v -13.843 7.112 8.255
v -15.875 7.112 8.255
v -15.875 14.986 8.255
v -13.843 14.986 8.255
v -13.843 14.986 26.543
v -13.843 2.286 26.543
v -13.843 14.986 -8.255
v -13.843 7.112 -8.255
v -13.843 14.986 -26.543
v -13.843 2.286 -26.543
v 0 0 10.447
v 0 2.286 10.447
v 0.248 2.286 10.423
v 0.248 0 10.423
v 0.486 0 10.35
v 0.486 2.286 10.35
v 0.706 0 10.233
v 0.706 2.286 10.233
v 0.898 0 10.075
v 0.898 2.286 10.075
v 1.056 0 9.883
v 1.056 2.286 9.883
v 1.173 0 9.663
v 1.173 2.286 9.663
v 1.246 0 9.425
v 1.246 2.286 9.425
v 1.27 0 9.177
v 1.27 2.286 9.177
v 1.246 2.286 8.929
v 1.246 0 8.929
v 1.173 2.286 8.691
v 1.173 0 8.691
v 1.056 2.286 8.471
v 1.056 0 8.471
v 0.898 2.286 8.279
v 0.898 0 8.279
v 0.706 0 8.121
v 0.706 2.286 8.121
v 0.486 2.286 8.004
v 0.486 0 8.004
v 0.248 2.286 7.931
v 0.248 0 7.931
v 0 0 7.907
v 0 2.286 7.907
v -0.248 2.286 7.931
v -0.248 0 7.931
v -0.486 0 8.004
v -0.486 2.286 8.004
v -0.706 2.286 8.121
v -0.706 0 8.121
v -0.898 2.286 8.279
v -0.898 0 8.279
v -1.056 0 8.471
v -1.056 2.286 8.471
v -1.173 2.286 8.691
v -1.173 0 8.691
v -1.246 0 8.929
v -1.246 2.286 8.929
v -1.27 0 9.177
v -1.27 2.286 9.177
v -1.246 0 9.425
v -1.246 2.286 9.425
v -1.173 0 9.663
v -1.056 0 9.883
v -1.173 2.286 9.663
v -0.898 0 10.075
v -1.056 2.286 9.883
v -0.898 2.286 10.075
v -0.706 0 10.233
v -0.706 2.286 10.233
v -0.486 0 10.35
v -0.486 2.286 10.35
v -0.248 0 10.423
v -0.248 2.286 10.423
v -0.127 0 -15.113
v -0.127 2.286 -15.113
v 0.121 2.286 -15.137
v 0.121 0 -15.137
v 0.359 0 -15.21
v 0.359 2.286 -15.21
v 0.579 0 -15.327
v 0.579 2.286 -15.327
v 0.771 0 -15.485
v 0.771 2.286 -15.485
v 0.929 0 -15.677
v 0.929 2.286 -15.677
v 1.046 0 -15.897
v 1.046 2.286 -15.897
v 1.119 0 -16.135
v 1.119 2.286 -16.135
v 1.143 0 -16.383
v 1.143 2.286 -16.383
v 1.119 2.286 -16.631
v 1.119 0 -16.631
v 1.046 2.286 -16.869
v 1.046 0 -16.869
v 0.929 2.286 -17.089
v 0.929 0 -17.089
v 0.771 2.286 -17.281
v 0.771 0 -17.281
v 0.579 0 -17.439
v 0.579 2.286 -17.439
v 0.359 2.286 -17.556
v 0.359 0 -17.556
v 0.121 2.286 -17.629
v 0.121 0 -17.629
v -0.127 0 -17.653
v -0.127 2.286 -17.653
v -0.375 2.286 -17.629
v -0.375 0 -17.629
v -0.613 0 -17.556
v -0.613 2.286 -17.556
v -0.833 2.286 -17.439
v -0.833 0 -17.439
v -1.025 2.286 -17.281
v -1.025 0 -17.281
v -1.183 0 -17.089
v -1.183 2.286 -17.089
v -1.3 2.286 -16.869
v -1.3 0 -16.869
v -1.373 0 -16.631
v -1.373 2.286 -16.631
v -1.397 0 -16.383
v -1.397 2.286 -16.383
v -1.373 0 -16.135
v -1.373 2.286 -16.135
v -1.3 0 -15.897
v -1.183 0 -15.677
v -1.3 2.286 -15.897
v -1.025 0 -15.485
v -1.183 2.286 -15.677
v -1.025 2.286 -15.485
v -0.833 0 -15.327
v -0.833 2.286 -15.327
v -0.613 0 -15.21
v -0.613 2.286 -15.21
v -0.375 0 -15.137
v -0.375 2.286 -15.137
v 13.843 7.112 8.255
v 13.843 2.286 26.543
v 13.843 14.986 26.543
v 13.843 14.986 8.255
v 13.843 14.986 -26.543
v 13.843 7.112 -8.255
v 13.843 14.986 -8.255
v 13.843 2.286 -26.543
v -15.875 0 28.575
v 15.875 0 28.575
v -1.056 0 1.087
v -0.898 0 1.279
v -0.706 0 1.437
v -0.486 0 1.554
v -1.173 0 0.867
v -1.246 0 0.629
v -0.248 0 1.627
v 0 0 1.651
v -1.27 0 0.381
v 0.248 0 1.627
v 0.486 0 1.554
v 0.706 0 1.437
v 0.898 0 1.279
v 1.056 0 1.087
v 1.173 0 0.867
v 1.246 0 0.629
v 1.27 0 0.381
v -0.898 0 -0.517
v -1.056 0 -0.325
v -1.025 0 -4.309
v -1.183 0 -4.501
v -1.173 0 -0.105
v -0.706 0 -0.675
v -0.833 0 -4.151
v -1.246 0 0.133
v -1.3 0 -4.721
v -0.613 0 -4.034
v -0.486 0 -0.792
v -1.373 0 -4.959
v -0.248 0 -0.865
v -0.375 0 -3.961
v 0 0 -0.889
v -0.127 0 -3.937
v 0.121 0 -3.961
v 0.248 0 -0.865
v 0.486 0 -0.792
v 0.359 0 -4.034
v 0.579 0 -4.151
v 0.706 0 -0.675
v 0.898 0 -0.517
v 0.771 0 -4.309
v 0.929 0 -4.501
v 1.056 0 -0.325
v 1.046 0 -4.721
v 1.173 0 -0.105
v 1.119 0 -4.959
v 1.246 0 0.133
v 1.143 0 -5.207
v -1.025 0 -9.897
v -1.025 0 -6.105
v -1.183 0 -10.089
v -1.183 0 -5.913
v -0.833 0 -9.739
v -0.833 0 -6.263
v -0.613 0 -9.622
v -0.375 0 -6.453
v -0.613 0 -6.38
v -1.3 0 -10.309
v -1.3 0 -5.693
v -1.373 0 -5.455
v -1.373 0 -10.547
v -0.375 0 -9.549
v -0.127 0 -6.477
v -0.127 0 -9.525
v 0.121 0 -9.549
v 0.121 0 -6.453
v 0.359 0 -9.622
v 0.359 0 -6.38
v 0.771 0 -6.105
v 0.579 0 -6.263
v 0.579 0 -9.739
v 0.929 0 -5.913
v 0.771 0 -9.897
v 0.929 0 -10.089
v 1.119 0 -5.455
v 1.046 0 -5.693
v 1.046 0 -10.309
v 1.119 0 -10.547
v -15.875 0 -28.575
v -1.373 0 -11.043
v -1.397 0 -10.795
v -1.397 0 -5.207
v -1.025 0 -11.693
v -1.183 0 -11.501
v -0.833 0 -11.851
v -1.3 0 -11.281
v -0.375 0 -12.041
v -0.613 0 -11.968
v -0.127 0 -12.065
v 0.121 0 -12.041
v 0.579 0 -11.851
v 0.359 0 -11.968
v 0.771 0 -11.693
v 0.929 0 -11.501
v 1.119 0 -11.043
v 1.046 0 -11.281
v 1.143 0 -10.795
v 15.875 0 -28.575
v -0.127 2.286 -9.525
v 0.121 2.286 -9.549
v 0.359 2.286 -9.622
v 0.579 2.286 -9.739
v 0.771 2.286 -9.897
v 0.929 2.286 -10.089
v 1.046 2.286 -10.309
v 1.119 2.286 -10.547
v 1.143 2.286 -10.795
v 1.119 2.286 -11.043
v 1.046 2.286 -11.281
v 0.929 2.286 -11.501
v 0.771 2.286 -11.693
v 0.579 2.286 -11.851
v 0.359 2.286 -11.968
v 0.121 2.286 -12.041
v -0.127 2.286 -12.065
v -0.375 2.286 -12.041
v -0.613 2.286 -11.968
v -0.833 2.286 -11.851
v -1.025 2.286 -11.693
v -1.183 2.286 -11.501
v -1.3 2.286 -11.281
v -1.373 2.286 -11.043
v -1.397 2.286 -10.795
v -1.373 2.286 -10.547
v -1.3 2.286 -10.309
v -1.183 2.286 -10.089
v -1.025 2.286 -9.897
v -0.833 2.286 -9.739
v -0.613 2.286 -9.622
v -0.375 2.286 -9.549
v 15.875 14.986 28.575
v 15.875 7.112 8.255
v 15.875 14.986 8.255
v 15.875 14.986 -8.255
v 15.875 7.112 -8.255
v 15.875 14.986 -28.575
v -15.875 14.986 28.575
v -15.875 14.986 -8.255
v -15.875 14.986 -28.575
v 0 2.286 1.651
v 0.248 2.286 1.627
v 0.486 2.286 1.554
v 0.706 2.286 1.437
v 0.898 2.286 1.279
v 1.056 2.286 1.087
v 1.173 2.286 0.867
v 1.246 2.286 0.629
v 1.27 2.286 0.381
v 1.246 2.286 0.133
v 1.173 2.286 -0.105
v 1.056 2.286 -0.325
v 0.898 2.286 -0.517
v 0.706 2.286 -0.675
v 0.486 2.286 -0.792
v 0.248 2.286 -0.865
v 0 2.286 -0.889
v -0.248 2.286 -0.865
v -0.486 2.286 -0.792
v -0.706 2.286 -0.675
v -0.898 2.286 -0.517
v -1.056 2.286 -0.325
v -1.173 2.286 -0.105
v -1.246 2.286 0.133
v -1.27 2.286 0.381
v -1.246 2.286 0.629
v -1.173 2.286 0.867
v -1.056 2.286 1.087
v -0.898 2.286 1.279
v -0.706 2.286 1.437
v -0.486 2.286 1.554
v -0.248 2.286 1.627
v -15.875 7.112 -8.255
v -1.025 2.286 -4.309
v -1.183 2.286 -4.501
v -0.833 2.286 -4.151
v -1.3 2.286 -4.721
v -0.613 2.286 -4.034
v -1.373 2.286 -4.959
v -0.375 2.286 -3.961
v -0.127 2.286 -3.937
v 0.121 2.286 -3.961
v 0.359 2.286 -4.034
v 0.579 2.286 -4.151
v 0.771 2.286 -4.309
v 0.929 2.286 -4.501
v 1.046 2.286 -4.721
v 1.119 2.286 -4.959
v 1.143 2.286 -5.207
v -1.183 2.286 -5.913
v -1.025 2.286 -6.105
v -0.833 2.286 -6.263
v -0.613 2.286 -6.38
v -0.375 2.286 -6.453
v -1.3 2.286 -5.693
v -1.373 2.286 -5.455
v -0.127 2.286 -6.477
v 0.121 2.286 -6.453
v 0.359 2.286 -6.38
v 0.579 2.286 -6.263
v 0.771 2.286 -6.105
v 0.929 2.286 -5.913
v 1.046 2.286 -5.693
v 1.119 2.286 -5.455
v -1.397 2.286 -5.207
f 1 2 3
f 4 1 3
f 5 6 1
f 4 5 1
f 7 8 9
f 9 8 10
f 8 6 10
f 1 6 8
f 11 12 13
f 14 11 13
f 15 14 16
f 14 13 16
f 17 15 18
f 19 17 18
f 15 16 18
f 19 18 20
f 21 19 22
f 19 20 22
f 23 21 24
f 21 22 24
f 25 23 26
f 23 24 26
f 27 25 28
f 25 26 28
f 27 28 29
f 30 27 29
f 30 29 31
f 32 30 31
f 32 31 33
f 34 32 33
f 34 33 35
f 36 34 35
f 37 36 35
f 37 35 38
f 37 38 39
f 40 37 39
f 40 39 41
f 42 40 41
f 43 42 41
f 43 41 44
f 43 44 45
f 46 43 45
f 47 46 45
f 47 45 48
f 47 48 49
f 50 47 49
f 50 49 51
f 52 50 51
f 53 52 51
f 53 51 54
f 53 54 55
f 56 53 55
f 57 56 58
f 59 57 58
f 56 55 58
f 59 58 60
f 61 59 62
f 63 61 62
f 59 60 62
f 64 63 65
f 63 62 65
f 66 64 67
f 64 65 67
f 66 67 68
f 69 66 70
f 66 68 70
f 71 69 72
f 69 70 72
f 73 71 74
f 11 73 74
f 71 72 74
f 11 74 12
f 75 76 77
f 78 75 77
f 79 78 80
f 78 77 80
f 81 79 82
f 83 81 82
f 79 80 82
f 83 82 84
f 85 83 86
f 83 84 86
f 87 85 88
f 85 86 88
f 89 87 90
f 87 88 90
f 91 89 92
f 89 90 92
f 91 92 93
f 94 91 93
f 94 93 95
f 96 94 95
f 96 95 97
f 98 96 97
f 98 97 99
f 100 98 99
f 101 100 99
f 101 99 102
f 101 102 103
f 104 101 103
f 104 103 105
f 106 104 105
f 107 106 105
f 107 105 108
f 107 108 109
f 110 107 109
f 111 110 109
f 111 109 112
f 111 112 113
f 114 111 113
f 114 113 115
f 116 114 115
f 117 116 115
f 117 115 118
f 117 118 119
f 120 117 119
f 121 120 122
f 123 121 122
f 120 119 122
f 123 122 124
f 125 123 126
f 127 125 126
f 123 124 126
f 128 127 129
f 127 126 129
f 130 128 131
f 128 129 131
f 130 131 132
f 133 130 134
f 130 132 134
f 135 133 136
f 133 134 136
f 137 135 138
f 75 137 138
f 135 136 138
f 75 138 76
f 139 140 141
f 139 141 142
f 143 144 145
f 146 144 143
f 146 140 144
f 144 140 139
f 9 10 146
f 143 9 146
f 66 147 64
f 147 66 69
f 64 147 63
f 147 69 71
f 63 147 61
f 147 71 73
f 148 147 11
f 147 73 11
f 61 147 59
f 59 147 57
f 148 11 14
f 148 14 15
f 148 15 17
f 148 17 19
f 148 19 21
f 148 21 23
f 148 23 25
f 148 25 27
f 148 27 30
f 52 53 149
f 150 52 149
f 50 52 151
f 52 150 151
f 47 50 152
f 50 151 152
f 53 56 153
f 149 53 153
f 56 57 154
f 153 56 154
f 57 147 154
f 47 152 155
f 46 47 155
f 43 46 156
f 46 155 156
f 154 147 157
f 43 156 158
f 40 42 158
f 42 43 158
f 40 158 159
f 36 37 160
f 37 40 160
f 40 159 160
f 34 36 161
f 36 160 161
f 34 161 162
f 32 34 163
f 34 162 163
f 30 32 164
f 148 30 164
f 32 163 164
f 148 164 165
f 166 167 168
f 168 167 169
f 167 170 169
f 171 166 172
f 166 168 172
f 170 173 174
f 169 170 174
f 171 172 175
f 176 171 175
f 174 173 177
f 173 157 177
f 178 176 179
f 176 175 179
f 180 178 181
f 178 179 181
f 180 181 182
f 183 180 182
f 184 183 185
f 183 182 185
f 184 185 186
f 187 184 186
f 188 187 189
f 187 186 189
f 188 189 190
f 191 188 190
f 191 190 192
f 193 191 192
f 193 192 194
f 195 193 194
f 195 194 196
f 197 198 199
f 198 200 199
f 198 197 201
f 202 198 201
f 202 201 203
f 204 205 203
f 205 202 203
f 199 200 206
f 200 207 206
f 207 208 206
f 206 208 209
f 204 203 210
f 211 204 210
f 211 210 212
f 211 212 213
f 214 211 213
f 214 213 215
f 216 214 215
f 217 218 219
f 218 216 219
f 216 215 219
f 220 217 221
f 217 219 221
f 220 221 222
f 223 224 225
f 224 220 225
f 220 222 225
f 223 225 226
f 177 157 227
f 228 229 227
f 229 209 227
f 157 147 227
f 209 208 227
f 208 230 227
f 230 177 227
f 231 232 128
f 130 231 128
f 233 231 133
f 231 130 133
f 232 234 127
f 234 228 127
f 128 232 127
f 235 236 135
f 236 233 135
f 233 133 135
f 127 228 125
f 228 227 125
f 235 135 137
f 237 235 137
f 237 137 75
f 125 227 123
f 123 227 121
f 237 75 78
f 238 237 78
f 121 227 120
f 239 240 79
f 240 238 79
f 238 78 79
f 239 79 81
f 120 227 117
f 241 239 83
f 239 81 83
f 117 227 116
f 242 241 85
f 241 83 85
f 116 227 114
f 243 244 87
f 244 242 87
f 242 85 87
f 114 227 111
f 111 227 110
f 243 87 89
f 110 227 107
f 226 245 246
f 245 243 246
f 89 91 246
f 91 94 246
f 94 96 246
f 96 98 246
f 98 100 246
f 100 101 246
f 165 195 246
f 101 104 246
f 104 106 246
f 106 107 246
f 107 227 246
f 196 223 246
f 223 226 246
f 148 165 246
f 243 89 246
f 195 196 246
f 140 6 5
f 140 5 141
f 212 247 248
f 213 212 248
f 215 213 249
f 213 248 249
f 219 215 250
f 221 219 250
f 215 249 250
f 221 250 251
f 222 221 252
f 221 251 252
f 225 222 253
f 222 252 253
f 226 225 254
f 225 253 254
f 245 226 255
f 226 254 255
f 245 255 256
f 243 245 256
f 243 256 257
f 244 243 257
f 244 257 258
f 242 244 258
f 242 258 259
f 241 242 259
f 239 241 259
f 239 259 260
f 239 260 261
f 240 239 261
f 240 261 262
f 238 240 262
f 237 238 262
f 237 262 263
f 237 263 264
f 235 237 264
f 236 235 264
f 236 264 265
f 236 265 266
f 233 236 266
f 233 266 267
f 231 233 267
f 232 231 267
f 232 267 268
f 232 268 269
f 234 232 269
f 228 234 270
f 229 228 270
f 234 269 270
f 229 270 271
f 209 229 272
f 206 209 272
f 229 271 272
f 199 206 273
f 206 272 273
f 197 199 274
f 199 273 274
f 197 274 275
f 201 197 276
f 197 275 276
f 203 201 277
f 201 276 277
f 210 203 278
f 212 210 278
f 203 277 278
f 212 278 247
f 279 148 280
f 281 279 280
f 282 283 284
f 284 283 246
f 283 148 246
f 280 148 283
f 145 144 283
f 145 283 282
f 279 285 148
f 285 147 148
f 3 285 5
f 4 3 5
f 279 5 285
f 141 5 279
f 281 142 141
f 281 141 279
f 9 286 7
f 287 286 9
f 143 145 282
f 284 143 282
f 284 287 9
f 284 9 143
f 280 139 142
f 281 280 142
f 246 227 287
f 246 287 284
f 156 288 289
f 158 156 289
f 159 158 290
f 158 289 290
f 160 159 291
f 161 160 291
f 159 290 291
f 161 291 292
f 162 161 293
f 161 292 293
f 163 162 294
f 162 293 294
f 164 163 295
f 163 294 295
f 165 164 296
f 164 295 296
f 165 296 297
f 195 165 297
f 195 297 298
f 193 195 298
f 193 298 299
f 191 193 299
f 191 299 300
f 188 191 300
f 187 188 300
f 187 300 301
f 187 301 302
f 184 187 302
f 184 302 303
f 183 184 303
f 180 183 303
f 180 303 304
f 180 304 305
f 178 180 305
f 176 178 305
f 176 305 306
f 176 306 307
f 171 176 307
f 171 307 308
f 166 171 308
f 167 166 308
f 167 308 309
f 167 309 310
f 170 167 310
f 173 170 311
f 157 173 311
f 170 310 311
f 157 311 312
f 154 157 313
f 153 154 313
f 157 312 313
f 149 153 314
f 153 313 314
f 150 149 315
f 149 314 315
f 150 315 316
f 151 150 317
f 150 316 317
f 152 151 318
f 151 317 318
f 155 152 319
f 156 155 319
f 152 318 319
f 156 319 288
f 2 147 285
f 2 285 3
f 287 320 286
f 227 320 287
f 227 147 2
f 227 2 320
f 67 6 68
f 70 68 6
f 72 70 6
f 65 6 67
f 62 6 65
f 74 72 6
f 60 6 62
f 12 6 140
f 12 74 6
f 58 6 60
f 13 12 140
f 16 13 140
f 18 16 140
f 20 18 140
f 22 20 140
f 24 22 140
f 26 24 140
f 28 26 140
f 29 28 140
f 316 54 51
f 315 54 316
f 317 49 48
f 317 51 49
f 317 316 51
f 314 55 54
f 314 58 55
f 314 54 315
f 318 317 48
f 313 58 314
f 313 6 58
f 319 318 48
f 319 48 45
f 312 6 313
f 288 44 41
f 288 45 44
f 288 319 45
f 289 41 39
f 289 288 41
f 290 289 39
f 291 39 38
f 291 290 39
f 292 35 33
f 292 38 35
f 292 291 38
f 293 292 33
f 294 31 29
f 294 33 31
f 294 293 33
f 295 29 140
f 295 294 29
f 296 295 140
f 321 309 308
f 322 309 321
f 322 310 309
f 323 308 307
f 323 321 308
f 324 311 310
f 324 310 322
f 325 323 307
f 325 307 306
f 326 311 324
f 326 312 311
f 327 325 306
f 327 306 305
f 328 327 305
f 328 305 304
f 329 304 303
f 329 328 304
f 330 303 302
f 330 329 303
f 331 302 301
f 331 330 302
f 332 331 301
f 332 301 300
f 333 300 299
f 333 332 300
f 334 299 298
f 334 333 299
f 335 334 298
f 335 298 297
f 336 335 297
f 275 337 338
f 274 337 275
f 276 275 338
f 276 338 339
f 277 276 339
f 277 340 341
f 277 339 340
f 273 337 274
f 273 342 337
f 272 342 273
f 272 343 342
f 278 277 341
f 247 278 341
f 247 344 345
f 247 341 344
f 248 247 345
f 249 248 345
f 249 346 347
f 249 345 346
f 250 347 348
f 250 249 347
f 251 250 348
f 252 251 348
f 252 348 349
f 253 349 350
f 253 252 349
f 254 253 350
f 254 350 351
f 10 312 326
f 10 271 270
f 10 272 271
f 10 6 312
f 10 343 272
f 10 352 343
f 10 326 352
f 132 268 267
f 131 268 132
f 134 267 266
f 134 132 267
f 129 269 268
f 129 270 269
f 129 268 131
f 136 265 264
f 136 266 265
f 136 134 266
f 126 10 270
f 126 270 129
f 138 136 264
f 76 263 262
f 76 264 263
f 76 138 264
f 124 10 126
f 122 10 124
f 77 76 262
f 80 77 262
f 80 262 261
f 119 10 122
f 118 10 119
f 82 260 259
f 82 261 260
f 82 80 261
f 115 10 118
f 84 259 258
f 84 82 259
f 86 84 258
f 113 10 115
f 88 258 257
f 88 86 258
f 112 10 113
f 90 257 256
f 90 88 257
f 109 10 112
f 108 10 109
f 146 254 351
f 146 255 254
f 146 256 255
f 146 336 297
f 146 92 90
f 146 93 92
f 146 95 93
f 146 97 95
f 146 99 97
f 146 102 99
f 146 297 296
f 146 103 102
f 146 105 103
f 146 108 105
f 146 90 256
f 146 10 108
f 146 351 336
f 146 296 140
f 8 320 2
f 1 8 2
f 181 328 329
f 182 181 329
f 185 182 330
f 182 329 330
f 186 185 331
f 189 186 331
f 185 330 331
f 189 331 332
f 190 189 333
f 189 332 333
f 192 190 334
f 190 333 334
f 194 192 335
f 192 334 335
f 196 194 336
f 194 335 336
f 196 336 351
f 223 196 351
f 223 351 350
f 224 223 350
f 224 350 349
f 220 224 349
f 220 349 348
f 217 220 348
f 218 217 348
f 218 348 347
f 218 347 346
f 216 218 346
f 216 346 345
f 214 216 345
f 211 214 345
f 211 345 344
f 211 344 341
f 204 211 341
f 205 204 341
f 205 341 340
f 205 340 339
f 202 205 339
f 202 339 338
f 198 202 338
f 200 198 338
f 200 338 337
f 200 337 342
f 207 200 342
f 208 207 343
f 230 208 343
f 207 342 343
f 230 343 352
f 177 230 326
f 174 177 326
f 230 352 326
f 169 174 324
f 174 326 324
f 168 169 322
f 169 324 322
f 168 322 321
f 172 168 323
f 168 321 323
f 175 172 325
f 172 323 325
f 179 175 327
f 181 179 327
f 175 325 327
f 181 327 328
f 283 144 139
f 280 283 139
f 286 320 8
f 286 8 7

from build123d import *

# Parameters (mm, degrees)
SKETCH1_W           = 31.75
SKETCH1_H           = 57.15
BOSS_EXTRUDE1_DEPTH = 2.286
SKETCH2_W           = 31.75
SKETCH2_H           = 57.15
SKETCH2_W_2         = 27.686
SKETCH2_H_2         = 53.086
BOSS_EXTRUDE2_DEPTH = 12.7
SKETCH3_R           = 1.27
CUT_EXTRUDE1_DEPTH  = 36.06902123
SKETCH4_W           = 16.51
SKETCH4_H           = 7.874
CUT_EXTRUDE2_DEPTH  = 46.267795628


with BuildPart() as part:
    # Sketch1 → Boss-Extrude1 (new body)
    with BuildSketch(Plane(origin=(0, 0, 0), x_dir=(1, 0, 0), z_dir=(0, 1, 0))):
        Rectangle(SKETCH1_W, SKETCH1_H)
    extrude(amount=BOSS_EXTRUDE1_DEPTH)

    # Sketch2 → Boss-Extrude2 (add)
    with BuildSketch(Plane(origin=(0, 2.286, 0), x_dir=(1, 0, 0), z_dir=(0, 1, 0))):
        Rectangle(SKETCH2_W, SKETCH2_H)
        Rectangle(SKETCH2_W_2, SKETCH2_H_2, mode=Mode.SUBTRACT)
    extrude(amount=BOSS_EXTRUDE2_DEPTH)

    # Sketch3 → Cut-Extrude1 (cut, through all)
    with BuildSketch(Plane(origin=(0, 2.286, 0), x_dir=(1, 0, 0), z_dir=(0, 1, 0))):
        with Locations(Location((-0.127, 16.383, 0), (0, 0, 270))):
            Circle(SKETCH3_R)
        with Locations(Location((-0.127, 10.795, 0), (0, 0, 270))):
            Circle(SKETCH3_R)
        with Locations(Location((-0.127, 5.207, 0), (0, 0, 270))):
            Circle(SKETCH3_R)
        with Locations(Location((0, -0.381, 0), (0, 0, 270))):
            Circle(SKETCH3_R)
        with Locations(Location((0, -9.176980695, 0), (0, 0, 270))):
            Circle(SKETCH3_R)
    extrude(amount=-CUT_EXTRUDE1_DEPTH, mode=Mode.SUBTRACT)

    # Sketch4 → Cut-Extrude2 (cut, through all)
    with BuildSketch(Plane.ZY.offset(15.875)):
        with Locations((0, 11.049)):
            Rectangle(SKETCH4_W, SKETCH4_H)
    extrude(amount=-CUT_EXTRUDE2_DEPTH, mode=Mode.SUBTRACT)


solid = part.part
